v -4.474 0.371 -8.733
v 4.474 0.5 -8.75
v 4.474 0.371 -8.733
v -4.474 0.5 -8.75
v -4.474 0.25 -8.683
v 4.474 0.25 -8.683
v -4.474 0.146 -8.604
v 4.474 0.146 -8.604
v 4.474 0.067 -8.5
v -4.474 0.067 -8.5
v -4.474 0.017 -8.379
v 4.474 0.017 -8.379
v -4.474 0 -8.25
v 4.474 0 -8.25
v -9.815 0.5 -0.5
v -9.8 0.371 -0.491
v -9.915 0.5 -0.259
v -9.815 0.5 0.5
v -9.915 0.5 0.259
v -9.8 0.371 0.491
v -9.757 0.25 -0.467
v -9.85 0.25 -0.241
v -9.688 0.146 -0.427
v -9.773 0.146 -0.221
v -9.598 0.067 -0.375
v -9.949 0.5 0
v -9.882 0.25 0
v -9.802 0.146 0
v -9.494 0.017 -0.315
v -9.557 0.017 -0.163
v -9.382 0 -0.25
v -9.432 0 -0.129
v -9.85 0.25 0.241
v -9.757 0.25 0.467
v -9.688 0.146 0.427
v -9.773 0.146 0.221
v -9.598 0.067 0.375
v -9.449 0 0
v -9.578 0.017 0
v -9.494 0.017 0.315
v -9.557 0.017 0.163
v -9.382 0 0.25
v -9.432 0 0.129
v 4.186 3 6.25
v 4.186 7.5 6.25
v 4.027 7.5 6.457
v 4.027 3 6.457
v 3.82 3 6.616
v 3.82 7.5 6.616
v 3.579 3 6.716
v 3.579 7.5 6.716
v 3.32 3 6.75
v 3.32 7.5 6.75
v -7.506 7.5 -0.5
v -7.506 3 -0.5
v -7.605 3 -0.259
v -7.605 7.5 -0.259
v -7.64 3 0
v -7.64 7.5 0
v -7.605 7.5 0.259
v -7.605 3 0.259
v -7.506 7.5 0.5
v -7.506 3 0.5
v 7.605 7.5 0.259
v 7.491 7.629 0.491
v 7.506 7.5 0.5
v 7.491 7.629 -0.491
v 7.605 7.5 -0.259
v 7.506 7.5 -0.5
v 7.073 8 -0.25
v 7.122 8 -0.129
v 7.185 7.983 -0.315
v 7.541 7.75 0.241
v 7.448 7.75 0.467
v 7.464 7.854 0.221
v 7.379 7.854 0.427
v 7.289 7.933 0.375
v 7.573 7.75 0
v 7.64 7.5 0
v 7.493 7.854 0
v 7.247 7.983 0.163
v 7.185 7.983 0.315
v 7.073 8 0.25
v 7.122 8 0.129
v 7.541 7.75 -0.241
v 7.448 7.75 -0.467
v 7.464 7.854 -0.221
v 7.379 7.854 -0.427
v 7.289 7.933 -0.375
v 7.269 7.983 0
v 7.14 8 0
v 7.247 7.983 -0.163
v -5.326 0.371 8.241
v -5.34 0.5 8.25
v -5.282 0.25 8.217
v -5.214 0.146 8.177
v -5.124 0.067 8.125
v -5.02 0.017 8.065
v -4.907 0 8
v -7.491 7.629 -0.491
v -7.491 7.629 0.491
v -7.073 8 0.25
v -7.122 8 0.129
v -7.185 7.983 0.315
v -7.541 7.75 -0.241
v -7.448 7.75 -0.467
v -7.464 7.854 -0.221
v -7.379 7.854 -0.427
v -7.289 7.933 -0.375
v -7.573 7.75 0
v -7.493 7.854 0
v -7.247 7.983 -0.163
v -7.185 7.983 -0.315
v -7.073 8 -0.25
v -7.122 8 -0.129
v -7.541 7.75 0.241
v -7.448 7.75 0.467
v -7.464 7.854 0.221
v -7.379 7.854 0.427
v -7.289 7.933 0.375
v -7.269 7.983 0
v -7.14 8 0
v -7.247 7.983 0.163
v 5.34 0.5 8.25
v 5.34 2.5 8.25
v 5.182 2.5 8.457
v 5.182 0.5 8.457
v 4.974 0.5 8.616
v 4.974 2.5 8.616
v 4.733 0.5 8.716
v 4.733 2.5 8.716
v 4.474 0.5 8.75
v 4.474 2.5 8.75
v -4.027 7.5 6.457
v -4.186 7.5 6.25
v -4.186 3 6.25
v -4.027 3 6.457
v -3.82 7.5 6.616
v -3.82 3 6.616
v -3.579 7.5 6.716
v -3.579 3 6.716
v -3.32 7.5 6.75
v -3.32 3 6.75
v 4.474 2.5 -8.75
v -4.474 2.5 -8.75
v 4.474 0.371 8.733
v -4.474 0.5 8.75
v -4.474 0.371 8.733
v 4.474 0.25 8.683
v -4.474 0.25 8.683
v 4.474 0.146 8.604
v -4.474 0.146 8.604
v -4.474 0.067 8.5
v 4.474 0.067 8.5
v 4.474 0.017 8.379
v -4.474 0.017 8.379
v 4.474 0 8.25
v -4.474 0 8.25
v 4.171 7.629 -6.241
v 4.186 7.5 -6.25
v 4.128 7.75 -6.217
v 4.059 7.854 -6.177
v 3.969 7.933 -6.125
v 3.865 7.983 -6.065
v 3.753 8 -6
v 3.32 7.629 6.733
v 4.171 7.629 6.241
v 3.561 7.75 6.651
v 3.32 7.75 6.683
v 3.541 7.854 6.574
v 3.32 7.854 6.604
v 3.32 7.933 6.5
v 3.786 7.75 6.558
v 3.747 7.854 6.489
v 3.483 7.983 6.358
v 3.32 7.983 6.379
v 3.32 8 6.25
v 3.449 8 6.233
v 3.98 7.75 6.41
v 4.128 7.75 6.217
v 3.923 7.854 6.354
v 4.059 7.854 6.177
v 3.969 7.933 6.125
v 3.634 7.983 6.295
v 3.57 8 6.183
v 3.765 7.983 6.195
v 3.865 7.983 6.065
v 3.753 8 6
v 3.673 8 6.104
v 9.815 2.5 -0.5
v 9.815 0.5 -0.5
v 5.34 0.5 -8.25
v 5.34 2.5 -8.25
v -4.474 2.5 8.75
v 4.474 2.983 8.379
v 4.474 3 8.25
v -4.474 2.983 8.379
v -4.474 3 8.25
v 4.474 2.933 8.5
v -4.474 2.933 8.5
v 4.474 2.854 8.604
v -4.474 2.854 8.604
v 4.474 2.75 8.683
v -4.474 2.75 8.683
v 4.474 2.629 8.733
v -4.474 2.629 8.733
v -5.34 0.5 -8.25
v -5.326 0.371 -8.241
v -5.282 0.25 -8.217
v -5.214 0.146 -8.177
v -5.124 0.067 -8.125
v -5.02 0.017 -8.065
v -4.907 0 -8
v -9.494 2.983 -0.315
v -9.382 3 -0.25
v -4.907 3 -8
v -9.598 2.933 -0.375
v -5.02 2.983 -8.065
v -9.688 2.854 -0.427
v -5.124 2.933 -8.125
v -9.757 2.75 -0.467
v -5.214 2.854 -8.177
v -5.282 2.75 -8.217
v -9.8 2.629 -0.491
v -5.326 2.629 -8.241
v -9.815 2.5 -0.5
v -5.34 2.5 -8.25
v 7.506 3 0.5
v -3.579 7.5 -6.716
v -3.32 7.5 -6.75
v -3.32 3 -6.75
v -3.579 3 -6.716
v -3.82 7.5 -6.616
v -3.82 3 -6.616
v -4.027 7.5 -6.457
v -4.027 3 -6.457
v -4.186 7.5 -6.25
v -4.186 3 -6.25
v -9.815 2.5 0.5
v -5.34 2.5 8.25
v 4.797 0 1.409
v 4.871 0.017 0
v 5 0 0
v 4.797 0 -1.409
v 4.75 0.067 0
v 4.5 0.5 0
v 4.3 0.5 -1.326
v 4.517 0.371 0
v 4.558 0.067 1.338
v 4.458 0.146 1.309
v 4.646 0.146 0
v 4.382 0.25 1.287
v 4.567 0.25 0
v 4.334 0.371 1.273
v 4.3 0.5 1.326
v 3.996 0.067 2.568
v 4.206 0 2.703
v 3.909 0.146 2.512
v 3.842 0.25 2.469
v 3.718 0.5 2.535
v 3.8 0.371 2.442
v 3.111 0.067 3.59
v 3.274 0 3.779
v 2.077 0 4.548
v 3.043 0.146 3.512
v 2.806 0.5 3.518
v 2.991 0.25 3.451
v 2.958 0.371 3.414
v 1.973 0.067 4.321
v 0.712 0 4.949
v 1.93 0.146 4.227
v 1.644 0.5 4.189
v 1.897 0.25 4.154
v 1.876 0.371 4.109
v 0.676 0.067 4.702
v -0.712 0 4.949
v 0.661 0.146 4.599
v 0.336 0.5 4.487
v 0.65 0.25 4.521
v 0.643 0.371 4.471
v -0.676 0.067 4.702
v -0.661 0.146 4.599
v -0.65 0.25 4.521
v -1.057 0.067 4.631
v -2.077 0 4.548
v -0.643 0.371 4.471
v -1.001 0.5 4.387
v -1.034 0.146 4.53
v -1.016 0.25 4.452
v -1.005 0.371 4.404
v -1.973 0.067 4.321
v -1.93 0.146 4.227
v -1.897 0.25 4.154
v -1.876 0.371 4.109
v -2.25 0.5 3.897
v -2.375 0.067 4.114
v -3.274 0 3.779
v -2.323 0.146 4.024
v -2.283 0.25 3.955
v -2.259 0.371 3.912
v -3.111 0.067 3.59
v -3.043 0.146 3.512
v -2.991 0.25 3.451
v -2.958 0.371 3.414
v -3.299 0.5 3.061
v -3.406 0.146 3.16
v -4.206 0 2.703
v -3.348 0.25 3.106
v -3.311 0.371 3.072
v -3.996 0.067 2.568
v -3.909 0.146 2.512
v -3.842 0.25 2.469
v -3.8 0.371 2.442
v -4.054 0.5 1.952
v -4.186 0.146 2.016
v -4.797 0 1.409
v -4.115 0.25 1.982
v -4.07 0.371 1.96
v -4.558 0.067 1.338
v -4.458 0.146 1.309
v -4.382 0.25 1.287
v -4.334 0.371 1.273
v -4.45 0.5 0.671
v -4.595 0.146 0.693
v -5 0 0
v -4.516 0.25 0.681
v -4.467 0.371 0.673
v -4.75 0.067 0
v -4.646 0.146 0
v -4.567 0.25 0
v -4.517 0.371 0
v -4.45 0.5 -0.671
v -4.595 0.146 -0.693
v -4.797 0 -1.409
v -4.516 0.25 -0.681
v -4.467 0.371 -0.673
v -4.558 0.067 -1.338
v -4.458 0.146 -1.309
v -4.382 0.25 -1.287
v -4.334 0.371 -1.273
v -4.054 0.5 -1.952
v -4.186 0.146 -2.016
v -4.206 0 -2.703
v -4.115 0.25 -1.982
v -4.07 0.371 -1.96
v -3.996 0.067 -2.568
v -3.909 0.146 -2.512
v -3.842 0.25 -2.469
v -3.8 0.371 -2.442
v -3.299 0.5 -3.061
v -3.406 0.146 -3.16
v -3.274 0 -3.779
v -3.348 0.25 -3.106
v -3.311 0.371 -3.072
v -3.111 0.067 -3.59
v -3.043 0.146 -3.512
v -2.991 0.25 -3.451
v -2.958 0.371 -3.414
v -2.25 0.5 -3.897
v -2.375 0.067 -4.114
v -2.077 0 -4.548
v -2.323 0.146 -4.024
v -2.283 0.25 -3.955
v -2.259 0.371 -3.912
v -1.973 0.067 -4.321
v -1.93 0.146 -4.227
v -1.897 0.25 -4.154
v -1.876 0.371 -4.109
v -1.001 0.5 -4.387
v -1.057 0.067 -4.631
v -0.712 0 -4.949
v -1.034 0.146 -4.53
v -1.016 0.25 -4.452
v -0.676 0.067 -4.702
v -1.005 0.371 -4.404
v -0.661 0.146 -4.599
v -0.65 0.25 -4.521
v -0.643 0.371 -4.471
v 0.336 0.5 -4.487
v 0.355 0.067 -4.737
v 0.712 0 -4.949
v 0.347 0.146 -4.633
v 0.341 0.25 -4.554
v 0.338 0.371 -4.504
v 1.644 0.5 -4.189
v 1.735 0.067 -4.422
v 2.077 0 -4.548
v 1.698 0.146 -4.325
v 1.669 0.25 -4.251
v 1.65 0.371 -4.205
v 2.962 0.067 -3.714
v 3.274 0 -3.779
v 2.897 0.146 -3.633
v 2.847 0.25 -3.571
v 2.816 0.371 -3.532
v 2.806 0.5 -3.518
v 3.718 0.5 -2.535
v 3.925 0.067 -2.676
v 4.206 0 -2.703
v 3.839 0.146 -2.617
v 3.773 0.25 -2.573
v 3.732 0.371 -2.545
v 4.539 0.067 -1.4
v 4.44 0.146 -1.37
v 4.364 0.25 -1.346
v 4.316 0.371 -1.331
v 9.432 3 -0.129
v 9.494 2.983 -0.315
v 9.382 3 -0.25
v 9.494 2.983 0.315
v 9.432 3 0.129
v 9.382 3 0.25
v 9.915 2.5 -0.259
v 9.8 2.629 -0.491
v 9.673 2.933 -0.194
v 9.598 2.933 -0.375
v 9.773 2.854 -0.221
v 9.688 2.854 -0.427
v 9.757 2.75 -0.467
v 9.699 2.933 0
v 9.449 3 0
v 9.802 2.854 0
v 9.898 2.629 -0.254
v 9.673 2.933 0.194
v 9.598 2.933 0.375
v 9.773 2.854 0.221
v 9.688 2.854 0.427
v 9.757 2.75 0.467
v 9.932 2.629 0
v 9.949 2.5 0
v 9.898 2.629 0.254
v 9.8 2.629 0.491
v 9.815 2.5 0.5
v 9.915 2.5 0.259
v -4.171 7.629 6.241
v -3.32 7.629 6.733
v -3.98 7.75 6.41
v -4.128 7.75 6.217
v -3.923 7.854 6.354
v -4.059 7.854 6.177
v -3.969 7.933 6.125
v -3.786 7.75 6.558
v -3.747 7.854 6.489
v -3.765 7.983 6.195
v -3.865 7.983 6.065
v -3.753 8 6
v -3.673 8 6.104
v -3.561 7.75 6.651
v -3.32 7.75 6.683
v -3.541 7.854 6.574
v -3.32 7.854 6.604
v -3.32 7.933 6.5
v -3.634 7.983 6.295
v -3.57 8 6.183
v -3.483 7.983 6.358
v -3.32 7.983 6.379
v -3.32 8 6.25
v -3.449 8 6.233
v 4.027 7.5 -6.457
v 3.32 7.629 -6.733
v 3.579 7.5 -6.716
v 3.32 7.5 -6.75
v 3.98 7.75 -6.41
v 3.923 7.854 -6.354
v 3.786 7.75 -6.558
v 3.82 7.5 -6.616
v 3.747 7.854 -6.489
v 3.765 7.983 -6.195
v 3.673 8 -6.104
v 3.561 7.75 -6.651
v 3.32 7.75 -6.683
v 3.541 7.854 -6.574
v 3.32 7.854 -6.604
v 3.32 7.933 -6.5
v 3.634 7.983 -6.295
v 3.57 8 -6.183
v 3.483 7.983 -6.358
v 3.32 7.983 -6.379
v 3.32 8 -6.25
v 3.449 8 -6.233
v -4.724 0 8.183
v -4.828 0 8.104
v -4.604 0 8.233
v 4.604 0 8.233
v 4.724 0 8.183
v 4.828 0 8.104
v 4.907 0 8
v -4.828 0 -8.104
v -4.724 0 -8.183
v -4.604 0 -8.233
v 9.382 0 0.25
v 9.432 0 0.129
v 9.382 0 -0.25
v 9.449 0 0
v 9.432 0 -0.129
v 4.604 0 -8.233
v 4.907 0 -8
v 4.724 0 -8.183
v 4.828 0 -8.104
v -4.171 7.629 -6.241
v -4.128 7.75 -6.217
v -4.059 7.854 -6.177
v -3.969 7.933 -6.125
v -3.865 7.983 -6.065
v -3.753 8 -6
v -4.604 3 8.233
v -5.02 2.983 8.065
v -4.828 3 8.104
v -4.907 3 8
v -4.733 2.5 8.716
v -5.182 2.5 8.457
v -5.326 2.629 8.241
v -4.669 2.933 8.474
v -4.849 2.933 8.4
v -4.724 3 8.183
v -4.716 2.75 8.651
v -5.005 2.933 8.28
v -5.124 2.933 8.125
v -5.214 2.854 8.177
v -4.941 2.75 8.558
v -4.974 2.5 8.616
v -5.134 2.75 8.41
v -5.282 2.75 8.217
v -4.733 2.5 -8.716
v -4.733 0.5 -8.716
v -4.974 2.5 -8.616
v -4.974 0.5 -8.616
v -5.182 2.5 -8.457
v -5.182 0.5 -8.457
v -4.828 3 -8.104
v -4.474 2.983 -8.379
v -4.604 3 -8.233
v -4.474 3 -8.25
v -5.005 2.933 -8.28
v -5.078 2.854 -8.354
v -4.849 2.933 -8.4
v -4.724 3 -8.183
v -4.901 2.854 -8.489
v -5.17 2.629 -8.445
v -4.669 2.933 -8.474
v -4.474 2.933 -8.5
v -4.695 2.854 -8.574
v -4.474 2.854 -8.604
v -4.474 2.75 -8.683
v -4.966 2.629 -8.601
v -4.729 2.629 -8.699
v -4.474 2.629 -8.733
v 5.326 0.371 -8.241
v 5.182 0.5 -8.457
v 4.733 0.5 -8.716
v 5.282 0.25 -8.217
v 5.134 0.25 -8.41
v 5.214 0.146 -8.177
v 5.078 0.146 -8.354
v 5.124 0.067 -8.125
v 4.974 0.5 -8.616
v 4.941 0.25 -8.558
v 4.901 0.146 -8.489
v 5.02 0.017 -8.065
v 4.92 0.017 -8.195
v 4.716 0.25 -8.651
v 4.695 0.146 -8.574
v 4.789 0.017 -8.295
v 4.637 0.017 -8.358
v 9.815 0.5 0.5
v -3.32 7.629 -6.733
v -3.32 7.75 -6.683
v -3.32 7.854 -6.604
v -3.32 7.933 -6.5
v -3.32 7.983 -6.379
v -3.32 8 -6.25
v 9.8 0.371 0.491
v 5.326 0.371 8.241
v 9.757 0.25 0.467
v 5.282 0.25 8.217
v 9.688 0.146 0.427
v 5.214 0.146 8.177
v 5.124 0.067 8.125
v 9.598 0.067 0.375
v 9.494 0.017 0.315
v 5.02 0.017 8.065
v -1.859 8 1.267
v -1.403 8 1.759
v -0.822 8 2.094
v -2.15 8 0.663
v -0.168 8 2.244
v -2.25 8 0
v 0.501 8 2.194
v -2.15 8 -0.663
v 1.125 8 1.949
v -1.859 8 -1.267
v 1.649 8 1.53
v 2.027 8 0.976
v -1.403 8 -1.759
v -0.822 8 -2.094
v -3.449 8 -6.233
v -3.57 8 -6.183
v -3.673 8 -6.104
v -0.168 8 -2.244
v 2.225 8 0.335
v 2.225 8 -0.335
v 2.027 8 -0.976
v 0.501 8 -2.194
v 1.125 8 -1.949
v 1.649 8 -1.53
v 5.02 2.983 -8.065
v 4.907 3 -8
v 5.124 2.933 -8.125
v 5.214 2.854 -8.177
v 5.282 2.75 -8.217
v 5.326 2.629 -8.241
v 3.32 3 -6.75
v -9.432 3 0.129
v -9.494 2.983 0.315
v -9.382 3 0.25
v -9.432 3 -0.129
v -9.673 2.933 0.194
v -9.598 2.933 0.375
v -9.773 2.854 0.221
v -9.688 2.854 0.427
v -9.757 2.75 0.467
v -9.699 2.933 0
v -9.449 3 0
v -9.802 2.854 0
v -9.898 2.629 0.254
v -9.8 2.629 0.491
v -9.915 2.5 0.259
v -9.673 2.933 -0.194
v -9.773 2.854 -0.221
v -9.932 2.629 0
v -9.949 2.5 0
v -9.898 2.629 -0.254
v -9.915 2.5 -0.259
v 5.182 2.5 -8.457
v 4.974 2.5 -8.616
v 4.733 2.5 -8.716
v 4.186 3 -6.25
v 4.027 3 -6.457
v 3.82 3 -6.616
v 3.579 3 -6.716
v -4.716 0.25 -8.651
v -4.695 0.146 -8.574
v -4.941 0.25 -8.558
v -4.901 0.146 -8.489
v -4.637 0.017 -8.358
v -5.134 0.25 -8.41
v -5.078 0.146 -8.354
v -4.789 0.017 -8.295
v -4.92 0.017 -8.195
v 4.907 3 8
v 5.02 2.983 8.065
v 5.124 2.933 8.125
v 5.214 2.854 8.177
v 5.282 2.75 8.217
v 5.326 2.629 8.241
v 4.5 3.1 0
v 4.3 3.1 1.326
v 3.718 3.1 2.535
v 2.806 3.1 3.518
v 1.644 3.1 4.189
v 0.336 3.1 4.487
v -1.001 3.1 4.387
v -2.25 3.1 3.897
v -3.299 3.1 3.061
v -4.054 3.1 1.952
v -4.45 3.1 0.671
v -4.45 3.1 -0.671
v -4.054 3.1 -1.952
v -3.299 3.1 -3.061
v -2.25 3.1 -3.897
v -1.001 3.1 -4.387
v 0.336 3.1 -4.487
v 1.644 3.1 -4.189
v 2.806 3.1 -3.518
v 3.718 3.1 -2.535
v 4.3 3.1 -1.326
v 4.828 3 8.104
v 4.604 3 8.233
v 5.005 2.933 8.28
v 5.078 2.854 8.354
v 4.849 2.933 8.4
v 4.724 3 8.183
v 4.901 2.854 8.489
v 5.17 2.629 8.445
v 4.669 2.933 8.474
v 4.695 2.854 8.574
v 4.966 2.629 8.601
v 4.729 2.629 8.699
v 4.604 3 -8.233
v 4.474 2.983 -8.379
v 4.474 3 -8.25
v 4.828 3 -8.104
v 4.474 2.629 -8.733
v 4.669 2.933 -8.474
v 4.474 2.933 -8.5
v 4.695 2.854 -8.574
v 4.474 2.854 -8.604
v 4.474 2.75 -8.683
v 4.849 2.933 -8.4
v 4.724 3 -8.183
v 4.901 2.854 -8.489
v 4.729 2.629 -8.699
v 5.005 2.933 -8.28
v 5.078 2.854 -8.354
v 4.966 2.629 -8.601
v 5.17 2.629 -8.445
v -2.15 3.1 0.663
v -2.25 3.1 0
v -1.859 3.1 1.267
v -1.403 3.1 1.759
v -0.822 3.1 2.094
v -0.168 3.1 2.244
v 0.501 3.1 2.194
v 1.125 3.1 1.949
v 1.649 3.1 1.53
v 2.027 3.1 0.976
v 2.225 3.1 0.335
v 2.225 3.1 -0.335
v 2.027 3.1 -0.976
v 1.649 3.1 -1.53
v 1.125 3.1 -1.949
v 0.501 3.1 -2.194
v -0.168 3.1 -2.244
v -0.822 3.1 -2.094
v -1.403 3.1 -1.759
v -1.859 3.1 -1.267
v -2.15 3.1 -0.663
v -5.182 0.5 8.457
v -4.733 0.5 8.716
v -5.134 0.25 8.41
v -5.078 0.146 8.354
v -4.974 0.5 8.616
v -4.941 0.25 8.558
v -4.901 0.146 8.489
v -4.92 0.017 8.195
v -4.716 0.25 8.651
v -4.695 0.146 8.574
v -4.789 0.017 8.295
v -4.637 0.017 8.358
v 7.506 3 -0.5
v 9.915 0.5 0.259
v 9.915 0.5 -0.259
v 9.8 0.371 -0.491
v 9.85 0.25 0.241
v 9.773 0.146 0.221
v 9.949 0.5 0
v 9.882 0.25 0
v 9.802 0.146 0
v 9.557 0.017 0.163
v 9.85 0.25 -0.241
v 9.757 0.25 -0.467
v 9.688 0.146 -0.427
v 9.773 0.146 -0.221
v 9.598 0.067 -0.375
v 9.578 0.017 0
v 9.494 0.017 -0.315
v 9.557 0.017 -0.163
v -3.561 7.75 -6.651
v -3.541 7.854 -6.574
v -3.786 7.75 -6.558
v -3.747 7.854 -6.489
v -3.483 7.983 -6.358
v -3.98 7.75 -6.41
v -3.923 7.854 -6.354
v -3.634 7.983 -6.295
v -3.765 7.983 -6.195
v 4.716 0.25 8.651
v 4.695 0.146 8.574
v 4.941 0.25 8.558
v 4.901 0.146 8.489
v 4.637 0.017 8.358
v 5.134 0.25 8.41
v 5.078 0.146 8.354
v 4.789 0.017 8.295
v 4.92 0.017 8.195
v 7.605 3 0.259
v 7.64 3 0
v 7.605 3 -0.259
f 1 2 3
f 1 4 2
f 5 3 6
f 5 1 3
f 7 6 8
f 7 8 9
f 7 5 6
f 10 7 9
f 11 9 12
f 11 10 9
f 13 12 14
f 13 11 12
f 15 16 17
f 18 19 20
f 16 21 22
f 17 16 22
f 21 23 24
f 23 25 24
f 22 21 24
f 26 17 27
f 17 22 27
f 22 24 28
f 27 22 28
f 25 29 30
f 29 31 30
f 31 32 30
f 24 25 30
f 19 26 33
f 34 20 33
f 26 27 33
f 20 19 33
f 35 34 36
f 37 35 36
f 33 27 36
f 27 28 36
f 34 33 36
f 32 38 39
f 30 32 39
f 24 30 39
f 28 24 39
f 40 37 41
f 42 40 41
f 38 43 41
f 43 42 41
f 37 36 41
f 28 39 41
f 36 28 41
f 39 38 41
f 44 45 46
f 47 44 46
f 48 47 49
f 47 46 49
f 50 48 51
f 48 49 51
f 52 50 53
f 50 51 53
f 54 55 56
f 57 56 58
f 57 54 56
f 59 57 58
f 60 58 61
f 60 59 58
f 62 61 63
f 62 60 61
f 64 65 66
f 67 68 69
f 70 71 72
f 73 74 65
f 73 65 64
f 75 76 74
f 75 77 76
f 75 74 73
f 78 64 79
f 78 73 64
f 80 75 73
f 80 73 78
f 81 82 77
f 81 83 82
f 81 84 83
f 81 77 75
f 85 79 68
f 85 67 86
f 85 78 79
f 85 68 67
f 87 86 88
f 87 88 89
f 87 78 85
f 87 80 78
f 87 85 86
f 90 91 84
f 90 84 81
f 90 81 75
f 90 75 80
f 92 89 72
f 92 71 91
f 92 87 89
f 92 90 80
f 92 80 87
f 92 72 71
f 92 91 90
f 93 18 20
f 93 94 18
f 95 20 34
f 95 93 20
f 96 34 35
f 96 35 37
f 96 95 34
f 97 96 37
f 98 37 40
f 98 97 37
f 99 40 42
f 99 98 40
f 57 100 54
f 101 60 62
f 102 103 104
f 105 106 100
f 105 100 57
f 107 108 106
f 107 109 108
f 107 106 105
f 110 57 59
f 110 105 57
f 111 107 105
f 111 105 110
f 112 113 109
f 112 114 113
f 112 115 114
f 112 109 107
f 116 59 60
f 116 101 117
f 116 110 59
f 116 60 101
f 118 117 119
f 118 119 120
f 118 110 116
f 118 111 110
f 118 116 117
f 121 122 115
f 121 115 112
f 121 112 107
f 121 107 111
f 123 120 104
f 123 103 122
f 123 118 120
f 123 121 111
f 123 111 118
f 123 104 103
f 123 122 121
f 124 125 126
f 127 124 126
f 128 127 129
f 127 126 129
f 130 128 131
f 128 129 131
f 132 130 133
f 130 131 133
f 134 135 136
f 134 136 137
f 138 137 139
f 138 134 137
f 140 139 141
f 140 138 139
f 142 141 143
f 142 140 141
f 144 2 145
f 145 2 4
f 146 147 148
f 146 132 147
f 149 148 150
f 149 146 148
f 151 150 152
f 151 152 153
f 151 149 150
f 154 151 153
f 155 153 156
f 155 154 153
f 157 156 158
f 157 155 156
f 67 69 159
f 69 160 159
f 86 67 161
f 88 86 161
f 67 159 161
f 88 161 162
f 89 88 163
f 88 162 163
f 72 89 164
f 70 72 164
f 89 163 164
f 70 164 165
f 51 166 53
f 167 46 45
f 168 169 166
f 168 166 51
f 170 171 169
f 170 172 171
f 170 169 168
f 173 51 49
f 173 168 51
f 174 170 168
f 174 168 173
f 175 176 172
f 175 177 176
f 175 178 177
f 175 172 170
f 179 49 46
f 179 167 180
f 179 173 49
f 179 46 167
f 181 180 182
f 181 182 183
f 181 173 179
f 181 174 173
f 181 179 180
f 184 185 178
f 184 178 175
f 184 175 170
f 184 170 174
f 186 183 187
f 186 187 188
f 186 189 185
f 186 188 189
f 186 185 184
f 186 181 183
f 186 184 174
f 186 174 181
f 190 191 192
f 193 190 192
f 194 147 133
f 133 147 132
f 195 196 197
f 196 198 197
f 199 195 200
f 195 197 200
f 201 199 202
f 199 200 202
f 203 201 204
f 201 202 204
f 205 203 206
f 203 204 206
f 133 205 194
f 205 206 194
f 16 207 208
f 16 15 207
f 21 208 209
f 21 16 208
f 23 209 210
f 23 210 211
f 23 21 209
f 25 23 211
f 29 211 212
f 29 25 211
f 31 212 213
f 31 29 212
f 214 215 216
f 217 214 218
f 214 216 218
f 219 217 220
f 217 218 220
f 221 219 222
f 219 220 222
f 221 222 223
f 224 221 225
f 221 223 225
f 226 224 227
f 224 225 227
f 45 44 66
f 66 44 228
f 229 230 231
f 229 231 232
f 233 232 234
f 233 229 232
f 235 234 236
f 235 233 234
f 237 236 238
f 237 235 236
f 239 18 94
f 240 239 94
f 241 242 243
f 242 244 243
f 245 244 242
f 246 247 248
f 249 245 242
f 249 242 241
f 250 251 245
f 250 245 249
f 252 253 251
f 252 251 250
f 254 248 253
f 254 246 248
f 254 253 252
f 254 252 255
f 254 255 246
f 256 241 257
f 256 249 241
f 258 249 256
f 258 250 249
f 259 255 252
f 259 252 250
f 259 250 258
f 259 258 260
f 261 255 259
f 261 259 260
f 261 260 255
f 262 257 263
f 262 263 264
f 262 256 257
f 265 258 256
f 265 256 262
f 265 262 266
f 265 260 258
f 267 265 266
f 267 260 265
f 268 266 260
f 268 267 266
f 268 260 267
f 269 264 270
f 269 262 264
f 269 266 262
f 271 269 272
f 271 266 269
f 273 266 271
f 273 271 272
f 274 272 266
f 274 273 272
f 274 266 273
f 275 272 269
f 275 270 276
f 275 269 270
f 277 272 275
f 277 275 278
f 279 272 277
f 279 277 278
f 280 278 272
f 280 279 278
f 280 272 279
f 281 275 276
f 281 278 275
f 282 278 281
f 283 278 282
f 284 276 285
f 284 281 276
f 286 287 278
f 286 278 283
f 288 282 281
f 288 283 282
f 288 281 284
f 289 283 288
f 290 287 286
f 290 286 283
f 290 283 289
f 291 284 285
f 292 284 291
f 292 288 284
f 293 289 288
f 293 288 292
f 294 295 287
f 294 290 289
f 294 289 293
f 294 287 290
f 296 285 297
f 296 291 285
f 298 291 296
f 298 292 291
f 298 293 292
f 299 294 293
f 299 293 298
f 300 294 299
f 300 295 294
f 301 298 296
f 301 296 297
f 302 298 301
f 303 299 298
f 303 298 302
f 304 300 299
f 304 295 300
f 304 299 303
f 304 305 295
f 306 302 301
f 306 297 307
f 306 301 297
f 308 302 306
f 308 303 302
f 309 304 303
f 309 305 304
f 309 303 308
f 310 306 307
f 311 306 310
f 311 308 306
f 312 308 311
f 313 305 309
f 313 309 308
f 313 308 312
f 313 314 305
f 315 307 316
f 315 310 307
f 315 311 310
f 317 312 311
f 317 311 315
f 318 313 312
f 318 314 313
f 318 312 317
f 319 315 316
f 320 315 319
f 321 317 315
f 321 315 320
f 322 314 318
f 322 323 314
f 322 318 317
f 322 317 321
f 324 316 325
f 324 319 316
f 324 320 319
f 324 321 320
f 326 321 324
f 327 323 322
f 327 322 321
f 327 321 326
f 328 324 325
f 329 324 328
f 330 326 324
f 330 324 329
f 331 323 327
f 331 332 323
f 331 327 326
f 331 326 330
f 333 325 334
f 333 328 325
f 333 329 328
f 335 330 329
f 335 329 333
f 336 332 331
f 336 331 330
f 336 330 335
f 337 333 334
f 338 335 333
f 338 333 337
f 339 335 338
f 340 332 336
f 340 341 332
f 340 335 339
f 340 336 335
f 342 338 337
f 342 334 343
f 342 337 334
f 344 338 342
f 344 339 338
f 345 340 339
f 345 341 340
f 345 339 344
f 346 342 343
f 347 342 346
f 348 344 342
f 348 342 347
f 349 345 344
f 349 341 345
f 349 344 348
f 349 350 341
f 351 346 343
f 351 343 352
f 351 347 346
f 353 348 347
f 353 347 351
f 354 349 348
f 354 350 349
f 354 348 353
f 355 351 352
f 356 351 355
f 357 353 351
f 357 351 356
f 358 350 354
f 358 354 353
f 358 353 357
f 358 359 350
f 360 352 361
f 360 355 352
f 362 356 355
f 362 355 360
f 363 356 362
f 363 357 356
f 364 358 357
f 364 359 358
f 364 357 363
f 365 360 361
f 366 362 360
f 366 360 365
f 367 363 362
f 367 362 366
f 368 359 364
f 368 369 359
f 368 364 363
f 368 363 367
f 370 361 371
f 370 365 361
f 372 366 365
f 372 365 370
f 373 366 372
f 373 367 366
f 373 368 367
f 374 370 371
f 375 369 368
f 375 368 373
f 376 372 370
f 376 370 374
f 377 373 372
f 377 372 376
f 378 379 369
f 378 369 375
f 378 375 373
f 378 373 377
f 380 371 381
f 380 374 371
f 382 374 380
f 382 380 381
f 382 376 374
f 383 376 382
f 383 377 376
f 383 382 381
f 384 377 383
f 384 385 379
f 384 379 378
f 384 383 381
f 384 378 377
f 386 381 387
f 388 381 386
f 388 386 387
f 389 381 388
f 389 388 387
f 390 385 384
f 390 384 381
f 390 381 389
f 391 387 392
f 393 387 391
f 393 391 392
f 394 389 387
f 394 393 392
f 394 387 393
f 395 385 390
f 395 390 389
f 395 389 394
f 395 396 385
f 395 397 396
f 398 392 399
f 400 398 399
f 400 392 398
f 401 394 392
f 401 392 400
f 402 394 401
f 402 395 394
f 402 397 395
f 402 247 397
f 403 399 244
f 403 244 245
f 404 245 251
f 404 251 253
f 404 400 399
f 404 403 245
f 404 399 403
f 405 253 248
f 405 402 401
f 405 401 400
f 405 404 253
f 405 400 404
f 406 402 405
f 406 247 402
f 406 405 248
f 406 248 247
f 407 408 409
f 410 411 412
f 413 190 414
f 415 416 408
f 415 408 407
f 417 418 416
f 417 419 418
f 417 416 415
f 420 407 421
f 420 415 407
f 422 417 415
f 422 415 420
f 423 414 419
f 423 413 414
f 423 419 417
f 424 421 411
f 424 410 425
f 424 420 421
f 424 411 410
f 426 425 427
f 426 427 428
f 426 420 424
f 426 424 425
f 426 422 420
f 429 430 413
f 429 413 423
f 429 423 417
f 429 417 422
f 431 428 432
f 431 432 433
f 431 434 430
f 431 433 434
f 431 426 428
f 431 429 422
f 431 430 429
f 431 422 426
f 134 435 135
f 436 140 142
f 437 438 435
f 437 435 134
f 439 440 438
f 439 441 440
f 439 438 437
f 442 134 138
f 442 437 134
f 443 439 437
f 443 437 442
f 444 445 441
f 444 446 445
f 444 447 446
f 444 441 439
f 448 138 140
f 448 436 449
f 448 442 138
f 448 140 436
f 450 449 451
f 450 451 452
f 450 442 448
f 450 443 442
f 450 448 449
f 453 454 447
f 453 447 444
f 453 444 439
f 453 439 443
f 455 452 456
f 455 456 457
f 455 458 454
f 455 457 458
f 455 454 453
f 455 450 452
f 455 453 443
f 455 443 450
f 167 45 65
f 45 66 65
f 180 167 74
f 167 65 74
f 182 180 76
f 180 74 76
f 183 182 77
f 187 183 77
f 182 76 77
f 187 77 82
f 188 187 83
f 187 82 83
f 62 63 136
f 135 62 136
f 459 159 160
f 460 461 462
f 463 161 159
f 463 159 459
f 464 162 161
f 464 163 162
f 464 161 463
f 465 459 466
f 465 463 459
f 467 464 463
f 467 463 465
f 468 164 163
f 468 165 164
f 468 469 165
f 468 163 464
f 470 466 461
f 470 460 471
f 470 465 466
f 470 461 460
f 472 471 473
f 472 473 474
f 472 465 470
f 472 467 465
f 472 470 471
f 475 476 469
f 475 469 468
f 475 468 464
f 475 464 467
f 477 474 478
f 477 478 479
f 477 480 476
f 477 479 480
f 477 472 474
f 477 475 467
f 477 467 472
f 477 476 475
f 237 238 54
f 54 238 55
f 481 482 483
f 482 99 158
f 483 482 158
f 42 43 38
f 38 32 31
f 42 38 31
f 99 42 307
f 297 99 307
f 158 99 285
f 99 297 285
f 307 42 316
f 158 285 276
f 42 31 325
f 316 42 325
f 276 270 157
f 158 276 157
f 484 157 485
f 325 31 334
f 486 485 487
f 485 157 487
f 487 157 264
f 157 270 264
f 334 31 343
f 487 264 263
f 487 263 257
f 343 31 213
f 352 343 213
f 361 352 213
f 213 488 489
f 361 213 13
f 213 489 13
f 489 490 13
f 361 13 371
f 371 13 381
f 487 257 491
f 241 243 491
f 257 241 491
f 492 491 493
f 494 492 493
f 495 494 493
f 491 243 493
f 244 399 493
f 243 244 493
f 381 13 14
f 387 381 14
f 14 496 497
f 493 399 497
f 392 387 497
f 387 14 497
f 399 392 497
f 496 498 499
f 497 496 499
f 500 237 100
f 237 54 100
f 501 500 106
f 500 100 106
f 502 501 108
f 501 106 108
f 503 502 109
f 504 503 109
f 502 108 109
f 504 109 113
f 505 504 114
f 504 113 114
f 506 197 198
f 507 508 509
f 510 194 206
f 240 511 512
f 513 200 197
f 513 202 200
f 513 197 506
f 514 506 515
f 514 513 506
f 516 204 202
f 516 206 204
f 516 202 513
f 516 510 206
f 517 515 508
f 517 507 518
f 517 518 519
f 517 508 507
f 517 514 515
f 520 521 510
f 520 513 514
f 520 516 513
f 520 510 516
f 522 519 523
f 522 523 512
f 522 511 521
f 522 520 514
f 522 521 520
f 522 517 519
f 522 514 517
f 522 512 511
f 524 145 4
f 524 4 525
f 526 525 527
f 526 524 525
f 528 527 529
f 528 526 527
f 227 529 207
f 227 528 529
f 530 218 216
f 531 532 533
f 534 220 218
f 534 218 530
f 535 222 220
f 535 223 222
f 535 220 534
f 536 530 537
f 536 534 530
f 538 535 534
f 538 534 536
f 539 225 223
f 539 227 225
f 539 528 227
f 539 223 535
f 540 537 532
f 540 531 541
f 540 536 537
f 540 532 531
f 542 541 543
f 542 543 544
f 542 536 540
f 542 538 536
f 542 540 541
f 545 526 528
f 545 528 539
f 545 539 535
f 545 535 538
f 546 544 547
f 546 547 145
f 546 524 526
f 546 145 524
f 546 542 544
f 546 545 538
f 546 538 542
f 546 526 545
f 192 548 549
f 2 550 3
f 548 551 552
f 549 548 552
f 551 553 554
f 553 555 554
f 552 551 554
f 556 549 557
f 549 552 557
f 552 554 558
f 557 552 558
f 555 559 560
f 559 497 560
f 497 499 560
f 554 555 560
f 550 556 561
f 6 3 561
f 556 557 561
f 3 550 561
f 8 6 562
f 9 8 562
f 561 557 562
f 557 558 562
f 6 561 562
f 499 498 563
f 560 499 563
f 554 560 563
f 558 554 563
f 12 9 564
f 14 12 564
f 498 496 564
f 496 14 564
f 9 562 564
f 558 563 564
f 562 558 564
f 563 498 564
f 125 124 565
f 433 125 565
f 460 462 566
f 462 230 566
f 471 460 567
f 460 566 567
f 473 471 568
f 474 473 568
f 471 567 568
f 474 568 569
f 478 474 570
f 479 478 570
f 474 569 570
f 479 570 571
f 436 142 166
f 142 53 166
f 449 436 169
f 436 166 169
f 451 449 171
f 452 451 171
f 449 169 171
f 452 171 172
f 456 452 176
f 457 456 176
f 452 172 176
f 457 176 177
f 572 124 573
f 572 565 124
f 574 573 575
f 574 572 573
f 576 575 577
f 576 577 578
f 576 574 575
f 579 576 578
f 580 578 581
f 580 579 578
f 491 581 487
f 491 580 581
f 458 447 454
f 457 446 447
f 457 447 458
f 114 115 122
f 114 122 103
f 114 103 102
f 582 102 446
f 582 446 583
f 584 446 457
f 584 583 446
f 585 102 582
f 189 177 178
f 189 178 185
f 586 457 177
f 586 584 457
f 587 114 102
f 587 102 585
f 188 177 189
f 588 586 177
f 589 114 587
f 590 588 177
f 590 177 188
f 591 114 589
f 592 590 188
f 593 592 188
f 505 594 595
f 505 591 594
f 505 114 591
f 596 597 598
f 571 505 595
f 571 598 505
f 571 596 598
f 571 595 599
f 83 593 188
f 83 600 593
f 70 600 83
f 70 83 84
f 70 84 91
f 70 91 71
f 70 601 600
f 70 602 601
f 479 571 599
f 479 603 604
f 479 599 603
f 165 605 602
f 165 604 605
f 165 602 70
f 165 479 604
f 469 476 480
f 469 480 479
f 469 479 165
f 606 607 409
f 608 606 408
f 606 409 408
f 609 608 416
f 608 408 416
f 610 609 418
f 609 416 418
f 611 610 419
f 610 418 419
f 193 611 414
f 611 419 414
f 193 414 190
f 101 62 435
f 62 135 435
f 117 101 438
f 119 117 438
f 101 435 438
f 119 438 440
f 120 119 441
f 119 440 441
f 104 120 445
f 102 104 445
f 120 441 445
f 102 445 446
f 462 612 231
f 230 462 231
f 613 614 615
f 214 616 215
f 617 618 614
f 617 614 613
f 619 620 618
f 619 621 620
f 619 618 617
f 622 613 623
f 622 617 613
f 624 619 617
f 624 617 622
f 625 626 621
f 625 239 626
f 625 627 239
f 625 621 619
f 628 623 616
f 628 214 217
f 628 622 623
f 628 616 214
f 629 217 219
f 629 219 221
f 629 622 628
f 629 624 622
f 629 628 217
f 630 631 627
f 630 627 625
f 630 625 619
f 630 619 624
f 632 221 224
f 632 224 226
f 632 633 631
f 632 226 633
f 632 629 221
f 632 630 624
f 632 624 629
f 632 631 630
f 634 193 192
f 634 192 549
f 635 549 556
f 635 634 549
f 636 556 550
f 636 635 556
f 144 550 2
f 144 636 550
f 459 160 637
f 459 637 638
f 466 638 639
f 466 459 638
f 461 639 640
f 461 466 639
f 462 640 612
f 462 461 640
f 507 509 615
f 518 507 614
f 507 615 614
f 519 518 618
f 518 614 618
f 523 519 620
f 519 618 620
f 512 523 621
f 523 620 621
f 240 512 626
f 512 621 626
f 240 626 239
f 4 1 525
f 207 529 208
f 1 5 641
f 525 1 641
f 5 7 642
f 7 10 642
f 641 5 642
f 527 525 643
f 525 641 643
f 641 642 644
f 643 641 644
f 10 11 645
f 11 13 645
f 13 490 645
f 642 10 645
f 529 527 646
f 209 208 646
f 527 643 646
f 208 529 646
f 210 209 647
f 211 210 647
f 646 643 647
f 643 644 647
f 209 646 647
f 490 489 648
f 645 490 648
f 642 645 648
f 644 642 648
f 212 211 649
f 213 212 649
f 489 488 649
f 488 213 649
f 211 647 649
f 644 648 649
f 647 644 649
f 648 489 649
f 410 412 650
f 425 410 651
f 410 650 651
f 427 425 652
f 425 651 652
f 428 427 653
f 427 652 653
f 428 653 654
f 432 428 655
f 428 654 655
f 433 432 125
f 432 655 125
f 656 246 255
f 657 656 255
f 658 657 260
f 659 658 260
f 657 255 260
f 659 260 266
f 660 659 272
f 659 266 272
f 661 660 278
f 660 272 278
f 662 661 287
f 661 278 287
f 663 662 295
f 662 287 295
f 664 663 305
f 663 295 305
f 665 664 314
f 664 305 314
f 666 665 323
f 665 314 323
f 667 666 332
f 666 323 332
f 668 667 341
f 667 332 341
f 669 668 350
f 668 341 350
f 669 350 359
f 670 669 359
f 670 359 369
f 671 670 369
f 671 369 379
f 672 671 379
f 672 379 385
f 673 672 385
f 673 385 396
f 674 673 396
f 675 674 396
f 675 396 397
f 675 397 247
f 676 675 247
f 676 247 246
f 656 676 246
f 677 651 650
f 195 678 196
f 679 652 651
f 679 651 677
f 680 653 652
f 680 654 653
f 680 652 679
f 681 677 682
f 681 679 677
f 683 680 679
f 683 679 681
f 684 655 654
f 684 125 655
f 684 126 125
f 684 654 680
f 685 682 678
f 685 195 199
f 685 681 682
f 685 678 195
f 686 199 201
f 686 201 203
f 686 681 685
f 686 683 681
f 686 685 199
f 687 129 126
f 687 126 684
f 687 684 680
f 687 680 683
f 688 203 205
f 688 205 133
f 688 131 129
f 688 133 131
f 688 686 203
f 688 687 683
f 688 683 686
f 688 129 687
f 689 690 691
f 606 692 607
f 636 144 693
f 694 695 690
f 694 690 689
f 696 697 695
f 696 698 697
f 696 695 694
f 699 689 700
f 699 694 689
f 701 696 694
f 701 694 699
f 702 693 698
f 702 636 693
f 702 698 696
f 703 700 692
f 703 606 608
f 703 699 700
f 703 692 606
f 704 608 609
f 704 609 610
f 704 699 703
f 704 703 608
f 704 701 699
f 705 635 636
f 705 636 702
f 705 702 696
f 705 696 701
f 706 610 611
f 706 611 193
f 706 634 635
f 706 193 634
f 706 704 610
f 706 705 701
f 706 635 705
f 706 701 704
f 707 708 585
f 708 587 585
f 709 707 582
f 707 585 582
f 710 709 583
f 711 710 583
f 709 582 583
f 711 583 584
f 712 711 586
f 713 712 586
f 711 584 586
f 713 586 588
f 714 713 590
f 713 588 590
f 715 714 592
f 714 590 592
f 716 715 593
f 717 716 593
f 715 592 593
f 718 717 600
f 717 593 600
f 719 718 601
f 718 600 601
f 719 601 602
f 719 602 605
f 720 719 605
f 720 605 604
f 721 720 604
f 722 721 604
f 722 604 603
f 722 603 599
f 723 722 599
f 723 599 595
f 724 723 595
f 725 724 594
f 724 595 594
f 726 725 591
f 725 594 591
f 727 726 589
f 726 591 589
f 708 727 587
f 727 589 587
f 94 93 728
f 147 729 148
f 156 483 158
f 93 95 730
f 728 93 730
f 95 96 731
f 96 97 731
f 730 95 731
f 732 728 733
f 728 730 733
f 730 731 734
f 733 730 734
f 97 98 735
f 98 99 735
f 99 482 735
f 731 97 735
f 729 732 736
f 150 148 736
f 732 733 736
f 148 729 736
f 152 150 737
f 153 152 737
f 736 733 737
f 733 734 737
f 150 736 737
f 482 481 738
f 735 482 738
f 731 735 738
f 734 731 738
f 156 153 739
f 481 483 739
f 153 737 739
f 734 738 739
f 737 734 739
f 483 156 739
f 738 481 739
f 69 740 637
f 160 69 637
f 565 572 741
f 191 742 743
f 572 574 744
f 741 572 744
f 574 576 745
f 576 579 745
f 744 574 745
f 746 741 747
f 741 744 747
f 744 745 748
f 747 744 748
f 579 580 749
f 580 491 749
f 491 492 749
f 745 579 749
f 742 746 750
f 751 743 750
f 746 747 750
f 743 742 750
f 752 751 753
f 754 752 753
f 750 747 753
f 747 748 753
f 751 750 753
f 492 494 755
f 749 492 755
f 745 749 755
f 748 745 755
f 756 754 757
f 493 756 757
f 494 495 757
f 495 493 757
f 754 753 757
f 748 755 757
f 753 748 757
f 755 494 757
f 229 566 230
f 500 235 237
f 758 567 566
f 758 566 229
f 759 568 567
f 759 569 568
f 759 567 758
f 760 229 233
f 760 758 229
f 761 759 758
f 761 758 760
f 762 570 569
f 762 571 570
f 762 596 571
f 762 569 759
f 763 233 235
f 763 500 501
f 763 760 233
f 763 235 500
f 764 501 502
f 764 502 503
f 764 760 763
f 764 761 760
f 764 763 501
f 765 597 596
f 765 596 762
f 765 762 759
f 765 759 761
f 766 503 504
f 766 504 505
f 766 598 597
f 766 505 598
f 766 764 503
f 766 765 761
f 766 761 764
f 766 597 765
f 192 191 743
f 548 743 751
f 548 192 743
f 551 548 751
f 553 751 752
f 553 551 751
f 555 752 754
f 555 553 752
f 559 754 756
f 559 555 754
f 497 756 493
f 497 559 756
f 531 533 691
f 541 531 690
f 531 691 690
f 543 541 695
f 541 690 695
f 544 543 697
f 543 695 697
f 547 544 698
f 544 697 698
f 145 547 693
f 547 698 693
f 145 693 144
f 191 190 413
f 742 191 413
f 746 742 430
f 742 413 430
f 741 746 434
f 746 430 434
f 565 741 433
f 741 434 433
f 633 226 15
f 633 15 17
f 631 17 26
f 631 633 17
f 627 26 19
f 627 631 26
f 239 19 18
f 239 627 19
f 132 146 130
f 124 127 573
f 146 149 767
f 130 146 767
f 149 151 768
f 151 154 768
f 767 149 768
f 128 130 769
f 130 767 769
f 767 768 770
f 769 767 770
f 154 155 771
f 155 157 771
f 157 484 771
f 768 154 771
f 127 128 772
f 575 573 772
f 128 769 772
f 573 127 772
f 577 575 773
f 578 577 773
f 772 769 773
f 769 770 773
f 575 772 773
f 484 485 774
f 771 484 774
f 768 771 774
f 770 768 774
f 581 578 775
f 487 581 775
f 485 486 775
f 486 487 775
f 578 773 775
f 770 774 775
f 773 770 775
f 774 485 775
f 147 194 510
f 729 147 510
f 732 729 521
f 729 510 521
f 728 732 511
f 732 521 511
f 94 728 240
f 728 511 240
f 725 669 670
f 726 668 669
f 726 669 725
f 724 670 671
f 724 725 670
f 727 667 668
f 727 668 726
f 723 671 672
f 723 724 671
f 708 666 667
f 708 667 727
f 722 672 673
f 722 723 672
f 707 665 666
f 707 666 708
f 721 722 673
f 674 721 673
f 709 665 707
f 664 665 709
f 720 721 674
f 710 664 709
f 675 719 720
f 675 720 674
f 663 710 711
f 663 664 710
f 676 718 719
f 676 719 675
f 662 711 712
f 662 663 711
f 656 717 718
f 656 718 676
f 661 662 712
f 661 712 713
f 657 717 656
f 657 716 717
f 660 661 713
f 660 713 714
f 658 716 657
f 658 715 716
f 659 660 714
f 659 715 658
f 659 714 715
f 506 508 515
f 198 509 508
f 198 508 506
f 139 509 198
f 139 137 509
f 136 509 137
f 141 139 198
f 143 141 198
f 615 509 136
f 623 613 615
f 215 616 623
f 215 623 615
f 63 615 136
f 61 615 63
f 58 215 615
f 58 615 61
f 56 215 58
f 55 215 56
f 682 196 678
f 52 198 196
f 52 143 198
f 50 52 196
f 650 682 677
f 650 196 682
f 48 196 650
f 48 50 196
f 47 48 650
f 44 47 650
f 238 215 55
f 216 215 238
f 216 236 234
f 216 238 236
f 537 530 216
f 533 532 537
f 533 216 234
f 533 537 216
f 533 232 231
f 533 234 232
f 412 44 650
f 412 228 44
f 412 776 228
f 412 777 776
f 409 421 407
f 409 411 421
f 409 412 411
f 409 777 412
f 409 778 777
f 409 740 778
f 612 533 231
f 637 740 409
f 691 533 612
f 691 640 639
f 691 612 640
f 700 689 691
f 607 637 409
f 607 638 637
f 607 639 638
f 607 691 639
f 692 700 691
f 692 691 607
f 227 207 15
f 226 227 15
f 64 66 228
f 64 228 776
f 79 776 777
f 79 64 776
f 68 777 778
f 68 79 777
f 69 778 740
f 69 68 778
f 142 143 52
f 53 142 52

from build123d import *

# Parameters (mm, degrees)
BOSS_EXTRUDE1_DEPTH                      = 3
BOSS_EXTRUDE2_DEPTH                      = 5
CBORE_FOR_M4_PAN_HEAD_SCREW1_D           = 4.5
CBORE_FOR_M4_PAN_HEAD_SCREW1_CBORE_D     = 9
CBORE_FOR_M4_PAN_HEAD_SCREW1_CBORE_DEPTH = 3.1
FILLET1_R                                = 1
FILLET2_R                                = 1
FILLET5_R                                = 0.5
FILLET6_R                                = 0.5
FILLET7_R                                = 0.5


with BuildPart() as part:
    # Sketch1 → Boss-Extrude1 (new body)
    with BuildSketch(Plane(origin=(0, 0, 0), x_dir=(1, 0, 0), z_dir=(0, 1, 0))):
        Polygon((10.103629711, 0), (5.051814855, 8.75), (-5.051814855, 8.75), (-10.103629711, 0), (-5.051814855, -8.75), (5.051814855, -8.75), align=None)
    extrude(amount=BOSS_EXTRUDE1_DEPTH)

    # Sketch2 → Boss-Extrude2 (add)
    with BuildSketch(Plane(origin=(0, 3, 0), x_dir=(1, 0, 0), z_dir=(0, 1, 0))):
        Polygon((3.897114317, -6.75), (7.794228634, 0), (3.897114317, 6.75), (-3.897114317, 6.75), (-7.794228634, 0), (-3.897114317, -6.75), align=None)
    extrude(amount=BOSS_EXTRUDE2_DEPTH)

    # CBORE for M4 Pan Head Screw1 (through all)
    with Locations(Plane.XZ):
        with Locations((0, 0)):
            CounterBoreHole(CBORE_FOR_M4_PAN_HEAD_SCREW1_D / 2, CBORE_FOR_M4_PAN_HEAD_SCREW1_CBORE_D / 2, CBORE_FOR_M4_PAN_HEAD_SCREW1_CBORE_DEPTH)

    # Fillet1
    fillet1_edges = [part.edges().sort_by_distance(p)[0] for p in [
        (-3.897114317, 5.5, 6.75),
        (3.897114317, 5.5, 6.75),
        (7.794228634, 5.5, 0),
        (3.897114317, 5.5, -6.75),
        (-3.897114317, 5.5, -6.75),
        (-7.794228634, 5.5, 0),
    ]]
    fillet(fillet1_edges, radius=FILLET1_R)

    # Fillet2
    fillet2_edges = [part.edges().sort_by_distance(p)[0] for p in [
        (5.051814855, 1.5, 8.75),
        (-5.051814855, 1.5, 8.75),
        (-10.103629711, 1.5, 0),
        (-5.051814855, 1.5, -8.75),
        (5.051814855, 1.5, -8.75),
        (10.103629711, 1.5, 0),
    ]]
    fillet(fillet2_edges, radius=FILLET2_R)

    # Fillet5
    fillet5_edges = [part.edges().sort_by_distance(p)[0] for p in [
        (5.845671476, 8, -3.375),
        (5.845671476, 8, 3.375),
        (0, 8, 6.75),
        (0, 8, -6.75),
        (-5.845671476, 8, -3.375),
        (-5.845671476, 8, 3.375),
        (3.819764048, 8, -6.616025404),
        (-3.819764048, 8, -6.616025404),
        (-7.639528096, 8, 0),
        (-3.819764048, 8, 6.616025404),
        (3.819764048, 8, 6.616025404),
        (7.639528096, 8, 0),
    ]]
    fillet(fillet5_edges, radius=FILLET5_R)

    # Fillet6
    fillet6_edges = [part.edges().sort_by_distance(p)[0] for p in [
        (-4.5, 0, 0),
        (-7.577722283, 0, 4.375),
        (7.577722283, 0, 4.375),
        (0, 0, 8.75),
        (-7.577722283, 0, -4.375),
        (0, 0, -8.75),
        (7.577722283, 0, -4.375),
        (-4.974464586, 0, 8.616025404),
        (4.974464586, 0, 8.616025404),
        (9.948929172, 0, 0),
        (4.974464586, 0, -8.616025404),
        (-4.974464586, 0, -8.616025404),
        (-9.948929172, 0, 0),
    ]]
    fillet(fillet6_edges, radius=FILLET6_R)

    # Fillet7
    fillet7_edges = [part.edges().sort_by_distance(p)[0] for p in [
        (-4.974464586, 3, 8.616025404),
        (4.974464586, 3, 8.616025404),
        (9.948929172, 3, 0),
        (4.974464586, 3, -8.616025404),
        (-4.974464586, 3, -8.616025404),
        (-9.948929172, 3, 0),
        (-7.577722283, 3, 4.375),
        (-7.577722283, 3, -4.375),
        (7.577722283, 3, 4.375),
        (7.577722283, 3, -4.375),
        (0, 3, -8.75),
        (0, 3, 8.75),
    ]]
    fillet(fillet7_edges, radius=FILLET7_R)


solid = part.part
